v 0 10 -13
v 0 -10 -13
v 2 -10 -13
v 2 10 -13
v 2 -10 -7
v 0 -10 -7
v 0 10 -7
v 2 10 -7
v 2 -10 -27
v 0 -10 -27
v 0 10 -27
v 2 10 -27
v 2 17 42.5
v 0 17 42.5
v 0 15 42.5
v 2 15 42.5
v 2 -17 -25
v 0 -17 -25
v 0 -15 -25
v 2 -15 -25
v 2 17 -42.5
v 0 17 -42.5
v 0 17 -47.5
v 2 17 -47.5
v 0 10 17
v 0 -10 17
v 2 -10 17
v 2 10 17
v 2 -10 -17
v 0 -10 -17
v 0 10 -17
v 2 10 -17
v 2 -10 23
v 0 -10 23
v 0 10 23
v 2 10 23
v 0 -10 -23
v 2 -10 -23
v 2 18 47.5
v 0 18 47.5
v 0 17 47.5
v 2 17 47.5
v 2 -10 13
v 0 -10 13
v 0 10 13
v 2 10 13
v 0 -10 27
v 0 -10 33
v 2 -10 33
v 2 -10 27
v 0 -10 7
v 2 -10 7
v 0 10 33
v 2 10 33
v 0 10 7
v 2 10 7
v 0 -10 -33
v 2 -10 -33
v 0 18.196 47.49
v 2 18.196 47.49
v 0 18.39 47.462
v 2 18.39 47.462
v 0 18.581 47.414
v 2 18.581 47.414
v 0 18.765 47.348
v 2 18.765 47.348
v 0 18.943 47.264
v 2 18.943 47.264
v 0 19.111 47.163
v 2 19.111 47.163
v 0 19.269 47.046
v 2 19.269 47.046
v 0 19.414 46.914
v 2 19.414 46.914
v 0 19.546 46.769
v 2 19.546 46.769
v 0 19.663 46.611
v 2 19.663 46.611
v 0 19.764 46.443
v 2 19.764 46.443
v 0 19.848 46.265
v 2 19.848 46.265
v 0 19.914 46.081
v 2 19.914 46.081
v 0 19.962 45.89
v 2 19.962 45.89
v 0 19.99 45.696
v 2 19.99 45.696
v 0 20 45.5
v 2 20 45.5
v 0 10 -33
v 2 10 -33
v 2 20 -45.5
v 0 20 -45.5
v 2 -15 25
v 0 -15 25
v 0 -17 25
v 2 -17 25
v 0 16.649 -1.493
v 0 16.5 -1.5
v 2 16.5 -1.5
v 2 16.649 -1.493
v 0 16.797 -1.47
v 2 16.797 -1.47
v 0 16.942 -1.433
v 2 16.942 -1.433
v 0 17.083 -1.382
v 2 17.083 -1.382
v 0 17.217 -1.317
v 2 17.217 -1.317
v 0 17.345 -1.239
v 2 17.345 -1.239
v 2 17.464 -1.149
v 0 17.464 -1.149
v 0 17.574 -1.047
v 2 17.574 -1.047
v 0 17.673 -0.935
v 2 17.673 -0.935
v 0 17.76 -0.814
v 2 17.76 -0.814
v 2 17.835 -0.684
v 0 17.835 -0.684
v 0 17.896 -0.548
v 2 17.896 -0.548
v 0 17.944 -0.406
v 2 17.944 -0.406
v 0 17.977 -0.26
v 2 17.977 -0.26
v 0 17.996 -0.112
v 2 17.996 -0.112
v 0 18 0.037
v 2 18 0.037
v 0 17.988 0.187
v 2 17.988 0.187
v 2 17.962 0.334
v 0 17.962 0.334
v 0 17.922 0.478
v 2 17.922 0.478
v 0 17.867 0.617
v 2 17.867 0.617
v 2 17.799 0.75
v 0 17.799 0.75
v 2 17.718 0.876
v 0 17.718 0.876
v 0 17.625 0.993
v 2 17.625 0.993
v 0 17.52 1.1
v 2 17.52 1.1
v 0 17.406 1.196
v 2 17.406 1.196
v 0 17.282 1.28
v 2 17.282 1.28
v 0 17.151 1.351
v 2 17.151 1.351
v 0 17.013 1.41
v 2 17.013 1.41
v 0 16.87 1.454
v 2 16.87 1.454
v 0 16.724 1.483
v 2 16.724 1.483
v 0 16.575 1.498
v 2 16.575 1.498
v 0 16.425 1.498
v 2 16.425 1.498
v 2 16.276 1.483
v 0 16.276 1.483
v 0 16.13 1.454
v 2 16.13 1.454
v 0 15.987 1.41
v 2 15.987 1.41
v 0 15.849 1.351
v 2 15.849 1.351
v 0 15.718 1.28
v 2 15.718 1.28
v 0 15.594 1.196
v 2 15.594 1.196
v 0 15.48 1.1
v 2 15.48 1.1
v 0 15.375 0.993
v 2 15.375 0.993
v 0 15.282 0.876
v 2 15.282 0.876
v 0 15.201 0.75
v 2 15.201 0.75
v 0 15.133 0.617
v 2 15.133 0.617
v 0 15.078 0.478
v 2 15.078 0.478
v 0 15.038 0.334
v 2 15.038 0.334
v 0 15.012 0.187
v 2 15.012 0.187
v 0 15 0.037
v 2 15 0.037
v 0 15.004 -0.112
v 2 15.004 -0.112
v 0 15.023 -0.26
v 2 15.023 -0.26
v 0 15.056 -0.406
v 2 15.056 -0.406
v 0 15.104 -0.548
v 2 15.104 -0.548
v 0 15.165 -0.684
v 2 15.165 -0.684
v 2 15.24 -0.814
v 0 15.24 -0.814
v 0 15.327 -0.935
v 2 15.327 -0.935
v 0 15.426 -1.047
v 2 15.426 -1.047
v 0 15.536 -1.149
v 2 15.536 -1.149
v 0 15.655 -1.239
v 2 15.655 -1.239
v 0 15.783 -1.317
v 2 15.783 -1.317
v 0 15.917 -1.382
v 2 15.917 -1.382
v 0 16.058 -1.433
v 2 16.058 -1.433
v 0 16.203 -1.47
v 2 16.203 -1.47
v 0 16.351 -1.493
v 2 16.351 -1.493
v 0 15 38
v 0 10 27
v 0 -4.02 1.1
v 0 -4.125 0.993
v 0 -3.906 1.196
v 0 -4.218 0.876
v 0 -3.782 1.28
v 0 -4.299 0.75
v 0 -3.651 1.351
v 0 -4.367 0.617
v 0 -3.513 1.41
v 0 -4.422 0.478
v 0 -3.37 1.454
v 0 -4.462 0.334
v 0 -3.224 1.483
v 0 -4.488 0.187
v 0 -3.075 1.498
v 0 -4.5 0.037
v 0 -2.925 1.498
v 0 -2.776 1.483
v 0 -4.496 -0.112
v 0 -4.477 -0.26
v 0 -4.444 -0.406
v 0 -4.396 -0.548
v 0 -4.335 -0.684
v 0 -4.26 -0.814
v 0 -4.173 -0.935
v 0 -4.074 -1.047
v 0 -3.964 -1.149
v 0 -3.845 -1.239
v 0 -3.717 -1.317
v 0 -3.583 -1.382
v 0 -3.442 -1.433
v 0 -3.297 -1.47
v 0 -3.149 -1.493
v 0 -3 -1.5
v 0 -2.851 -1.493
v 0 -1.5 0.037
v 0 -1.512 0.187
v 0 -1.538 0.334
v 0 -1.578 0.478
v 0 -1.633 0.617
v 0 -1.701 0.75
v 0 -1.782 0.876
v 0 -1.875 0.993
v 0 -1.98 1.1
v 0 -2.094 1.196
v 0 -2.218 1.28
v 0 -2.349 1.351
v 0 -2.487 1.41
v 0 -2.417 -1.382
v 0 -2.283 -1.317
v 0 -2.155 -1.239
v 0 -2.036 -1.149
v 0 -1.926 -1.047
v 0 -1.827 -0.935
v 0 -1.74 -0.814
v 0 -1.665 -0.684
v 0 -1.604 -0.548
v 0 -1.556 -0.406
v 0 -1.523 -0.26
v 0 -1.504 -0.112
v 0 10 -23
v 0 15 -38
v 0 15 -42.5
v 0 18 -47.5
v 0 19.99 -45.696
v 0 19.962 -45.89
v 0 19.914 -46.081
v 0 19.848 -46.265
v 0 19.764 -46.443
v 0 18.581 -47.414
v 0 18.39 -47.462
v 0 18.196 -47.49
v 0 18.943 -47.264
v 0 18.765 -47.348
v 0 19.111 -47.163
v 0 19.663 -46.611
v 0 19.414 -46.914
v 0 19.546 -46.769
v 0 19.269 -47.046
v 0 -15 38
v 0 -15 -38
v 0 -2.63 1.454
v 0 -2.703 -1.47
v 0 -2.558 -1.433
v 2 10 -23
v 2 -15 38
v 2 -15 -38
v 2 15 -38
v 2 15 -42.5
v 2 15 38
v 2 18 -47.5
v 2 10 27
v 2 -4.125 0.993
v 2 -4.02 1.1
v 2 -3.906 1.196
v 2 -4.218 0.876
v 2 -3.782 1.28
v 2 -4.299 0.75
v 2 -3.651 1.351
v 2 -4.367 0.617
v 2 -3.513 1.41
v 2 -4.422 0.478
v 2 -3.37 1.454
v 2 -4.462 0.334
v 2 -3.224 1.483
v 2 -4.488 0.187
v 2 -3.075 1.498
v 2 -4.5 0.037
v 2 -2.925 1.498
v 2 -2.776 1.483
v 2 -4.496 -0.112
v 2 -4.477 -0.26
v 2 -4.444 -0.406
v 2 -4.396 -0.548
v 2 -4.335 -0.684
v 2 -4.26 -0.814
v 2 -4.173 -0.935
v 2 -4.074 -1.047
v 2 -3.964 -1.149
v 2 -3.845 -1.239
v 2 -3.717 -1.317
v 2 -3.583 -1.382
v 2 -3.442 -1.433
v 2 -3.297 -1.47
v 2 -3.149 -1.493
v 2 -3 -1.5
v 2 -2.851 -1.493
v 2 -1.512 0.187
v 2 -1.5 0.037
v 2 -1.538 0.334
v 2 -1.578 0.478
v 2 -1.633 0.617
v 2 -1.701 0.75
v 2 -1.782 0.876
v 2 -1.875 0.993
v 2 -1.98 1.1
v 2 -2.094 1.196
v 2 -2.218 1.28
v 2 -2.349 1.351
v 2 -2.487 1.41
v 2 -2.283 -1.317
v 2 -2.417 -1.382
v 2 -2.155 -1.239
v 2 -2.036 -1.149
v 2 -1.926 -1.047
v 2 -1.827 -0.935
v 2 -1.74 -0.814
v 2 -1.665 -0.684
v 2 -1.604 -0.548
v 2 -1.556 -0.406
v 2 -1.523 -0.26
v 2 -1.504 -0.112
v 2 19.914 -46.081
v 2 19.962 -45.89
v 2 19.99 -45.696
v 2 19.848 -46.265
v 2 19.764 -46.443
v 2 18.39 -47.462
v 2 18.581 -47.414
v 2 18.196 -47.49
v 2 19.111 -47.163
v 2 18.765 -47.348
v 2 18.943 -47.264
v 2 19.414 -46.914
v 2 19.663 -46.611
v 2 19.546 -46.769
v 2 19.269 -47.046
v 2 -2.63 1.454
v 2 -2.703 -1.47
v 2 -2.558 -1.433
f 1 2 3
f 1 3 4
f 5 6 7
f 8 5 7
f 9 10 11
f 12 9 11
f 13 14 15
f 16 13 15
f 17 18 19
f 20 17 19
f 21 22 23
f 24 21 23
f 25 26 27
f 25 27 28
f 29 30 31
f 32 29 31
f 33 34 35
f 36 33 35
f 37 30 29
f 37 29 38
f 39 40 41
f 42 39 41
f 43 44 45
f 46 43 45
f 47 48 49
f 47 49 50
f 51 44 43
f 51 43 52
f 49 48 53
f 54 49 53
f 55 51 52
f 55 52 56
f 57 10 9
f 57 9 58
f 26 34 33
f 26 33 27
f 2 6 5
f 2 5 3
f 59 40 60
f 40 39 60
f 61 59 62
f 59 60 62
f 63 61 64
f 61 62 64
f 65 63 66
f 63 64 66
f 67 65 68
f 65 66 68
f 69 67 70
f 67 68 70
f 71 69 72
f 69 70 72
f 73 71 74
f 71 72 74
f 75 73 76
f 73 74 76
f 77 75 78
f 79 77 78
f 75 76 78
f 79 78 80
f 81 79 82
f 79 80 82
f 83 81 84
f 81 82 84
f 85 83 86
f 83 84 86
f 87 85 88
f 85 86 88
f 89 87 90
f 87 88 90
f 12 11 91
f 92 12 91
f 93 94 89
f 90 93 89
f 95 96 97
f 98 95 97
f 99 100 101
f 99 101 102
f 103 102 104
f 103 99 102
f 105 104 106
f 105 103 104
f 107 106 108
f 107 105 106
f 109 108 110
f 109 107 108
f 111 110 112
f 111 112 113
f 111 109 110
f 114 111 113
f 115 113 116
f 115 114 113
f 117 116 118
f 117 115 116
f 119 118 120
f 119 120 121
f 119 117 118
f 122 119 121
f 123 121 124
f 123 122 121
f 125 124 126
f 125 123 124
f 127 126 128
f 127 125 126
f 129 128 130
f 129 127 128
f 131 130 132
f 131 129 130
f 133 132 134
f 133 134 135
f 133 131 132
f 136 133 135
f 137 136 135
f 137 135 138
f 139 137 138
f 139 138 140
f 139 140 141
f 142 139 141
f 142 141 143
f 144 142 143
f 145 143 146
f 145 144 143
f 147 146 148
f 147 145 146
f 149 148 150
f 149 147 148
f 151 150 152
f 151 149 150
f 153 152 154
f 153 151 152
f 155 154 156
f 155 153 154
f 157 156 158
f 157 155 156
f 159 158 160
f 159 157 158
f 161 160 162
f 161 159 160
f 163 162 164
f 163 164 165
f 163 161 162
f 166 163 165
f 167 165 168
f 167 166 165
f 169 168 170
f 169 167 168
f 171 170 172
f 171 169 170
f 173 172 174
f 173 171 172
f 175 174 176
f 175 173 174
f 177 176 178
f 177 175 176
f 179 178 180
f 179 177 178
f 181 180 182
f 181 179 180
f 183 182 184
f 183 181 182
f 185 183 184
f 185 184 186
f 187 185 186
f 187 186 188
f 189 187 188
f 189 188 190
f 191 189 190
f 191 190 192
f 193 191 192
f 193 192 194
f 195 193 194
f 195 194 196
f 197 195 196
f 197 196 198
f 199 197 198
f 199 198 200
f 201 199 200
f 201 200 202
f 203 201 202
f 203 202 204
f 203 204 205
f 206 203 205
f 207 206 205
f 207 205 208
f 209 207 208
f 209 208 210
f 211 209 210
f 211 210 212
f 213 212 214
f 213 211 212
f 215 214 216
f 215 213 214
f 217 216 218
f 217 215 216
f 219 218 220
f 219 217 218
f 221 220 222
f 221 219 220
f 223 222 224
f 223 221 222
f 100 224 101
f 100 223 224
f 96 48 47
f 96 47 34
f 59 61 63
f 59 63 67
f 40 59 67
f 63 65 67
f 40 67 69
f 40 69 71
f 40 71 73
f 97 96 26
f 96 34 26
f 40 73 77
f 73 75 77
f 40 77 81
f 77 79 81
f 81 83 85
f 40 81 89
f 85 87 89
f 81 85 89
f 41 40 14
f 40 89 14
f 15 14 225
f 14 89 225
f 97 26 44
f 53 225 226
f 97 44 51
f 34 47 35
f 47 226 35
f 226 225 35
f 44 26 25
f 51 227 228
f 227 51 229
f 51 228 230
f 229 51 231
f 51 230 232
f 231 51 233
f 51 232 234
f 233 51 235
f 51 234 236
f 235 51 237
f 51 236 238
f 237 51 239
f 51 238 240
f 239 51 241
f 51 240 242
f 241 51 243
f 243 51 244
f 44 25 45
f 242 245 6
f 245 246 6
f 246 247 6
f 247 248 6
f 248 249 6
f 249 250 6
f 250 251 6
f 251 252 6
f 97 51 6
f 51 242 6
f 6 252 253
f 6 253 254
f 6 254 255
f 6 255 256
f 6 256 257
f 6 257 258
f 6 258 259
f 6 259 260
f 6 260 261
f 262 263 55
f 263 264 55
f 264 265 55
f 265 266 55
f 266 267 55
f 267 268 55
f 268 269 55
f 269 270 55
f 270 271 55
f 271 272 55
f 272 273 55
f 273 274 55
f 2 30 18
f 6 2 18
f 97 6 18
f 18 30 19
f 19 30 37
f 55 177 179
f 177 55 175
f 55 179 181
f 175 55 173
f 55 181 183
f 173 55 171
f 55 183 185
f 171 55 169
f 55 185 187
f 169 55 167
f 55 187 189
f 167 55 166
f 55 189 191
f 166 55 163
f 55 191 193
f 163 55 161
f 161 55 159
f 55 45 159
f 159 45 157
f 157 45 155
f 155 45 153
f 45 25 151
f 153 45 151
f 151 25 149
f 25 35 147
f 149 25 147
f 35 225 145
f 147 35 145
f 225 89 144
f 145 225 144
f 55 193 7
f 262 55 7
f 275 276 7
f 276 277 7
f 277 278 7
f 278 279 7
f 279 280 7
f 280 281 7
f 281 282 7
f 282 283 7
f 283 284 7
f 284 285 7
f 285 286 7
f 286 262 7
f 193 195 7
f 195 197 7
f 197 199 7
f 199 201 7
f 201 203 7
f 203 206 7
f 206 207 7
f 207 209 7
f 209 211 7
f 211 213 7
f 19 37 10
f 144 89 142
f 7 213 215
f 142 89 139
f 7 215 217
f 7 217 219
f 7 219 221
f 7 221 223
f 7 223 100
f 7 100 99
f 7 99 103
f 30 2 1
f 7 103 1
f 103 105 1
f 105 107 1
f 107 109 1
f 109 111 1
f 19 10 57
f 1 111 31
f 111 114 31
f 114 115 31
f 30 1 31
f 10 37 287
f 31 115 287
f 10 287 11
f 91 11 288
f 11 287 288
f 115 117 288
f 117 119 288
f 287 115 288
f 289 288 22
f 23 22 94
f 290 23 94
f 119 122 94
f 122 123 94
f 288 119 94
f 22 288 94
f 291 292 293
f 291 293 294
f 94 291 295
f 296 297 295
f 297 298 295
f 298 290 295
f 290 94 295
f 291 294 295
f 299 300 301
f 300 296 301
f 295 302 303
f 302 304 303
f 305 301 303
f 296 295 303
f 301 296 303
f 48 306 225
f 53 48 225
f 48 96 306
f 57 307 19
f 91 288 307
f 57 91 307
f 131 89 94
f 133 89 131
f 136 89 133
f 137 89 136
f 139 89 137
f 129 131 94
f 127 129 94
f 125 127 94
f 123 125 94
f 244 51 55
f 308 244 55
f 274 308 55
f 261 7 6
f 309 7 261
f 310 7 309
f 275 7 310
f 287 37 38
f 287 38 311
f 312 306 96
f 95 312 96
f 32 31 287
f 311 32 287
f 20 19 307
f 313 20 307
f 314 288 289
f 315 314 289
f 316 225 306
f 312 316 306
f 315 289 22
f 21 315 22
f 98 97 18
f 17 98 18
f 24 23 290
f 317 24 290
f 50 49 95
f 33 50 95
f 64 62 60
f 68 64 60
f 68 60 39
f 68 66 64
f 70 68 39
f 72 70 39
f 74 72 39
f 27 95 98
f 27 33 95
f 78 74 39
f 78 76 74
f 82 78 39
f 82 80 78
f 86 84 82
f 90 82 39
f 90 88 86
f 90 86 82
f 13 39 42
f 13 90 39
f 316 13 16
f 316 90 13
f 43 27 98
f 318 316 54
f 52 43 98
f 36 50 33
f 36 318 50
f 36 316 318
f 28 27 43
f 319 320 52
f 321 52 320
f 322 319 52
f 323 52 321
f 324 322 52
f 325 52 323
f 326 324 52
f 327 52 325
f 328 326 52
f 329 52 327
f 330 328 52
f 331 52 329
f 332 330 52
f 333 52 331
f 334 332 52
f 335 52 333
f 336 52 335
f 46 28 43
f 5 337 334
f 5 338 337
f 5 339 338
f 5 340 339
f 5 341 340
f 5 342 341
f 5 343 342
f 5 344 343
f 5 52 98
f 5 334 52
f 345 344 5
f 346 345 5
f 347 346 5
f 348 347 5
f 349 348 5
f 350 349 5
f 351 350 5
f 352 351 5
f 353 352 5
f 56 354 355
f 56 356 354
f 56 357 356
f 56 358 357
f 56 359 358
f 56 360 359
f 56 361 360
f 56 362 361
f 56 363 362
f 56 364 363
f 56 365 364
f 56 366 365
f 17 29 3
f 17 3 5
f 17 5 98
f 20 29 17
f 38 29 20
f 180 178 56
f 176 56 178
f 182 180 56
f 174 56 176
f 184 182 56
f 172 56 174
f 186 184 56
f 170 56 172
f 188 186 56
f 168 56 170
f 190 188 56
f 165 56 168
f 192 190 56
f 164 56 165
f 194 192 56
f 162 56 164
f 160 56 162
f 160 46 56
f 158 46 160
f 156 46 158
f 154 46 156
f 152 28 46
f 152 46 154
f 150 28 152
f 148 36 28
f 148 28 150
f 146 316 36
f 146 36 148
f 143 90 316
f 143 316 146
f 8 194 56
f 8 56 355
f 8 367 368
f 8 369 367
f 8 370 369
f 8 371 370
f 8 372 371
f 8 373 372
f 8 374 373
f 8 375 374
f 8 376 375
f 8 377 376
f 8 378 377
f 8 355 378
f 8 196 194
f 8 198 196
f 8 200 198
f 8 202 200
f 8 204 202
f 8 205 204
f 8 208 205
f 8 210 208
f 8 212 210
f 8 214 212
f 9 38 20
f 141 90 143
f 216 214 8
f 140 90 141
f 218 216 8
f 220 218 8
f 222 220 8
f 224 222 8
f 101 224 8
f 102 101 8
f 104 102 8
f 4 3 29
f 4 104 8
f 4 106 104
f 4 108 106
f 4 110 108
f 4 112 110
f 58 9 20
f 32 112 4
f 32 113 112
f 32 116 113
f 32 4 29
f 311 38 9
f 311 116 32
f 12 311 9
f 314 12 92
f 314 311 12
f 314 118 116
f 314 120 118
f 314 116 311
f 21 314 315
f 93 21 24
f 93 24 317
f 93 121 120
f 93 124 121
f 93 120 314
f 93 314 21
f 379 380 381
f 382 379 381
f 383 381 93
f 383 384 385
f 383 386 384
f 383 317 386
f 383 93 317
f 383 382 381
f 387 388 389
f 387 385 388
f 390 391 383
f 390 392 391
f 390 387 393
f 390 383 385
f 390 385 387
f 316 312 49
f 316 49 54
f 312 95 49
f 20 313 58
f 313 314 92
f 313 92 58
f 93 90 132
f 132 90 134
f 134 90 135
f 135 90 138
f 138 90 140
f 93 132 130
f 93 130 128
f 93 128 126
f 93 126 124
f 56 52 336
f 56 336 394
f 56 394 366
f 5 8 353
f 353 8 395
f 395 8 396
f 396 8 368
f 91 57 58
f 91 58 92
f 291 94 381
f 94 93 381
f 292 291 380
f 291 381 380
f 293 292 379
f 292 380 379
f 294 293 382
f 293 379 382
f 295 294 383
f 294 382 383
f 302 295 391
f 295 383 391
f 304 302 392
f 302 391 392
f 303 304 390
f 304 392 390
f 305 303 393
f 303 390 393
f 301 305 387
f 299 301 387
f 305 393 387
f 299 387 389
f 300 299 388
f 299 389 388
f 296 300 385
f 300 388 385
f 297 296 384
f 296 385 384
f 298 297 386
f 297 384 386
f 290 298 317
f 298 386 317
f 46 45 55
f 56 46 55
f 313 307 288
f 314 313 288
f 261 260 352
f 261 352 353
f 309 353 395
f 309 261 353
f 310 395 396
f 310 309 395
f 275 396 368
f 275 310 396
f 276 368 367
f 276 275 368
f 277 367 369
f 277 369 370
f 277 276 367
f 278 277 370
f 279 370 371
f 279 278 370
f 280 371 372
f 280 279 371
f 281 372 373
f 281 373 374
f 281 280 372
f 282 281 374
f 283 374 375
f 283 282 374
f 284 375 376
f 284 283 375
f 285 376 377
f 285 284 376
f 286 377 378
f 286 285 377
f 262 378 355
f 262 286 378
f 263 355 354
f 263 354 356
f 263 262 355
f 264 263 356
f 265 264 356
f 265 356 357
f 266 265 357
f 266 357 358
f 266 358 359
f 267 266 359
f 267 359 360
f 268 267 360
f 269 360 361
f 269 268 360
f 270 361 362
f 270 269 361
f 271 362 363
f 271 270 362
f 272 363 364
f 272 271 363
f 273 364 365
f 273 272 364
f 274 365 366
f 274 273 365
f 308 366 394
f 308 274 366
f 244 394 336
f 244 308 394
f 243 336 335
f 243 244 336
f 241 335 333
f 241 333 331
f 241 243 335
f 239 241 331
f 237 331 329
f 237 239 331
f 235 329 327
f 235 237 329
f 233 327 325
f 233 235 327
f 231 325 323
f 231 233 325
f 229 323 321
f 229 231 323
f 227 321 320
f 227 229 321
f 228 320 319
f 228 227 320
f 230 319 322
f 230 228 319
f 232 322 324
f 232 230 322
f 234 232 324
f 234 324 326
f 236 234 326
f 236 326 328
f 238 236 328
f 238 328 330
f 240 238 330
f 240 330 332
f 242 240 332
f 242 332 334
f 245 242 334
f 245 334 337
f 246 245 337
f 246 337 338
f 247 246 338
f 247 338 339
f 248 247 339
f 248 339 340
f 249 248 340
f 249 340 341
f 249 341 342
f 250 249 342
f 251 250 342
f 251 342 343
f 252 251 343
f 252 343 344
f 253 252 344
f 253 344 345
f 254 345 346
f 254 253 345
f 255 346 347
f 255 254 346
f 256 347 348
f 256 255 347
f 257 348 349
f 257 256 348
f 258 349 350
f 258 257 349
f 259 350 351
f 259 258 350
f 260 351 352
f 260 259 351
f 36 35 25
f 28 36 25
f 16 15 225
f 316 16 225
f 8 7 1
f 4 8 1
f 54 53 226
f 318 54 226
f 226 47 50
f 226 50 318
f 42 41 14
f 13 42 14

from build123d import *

# Parameters (mm, degrees)
SKETCH1_R           = 1.5
SKETCH1_W           = 6
SKETCH1_H           = 20
BOSS_EXTRUDE1_DEPTH = 2
FILLET2_R           = 2


with BuildPart() as part:
    # Sketch1 → Boss-Extrude1 (new body)
    with BuildSketch(Plane(origin=(0, 0, 0), x_dir=(0, 0, -1), z_dir=(1, 0, 0))):
        Polygon((-25, -15), (-25, -17), (25, -17), (25, -15), (38, -15), (38, 15), (42.5, 15), (42.5, 17), (47.5, 17), (47.5, 20), (-47.5, 20), (-47.5, 17), (-42.5, 17), (-42.5, 15), (-38, 15), (-38, -15), align=None)
        with Locations((0, 16.5)):
            Circle(SKETCH1_R, mode=Mode.SUBTRACT)
        with Locations((0, -3)):
            Circle(SKETCH1_R, mode=Mode.SUBTRACT)
        with Locations((20, 0)):
            Rectangle(SKETCH1_W, SKETCH1_H, mode=Mode.SUBTRACT)
        with Locations((30, 0)):
            Rectangle(SKETCH1_W, SKETCH1_H, mode=Mode.SUBTRACT)
        with Locations((10, 0)):
            Rectangle(SKETCH1_W, SKETCH1_H, mode=Mode.SUBTRACT)
        with Locations((-10, 0)):
            Rectangle(SKETCH1_W, SKETCH1_H, mode=Mode.SUBTRACT)
        with Locations((-20, 0)):
            Rectangle(SKETCH1_W, SKETCH1_H, mode=Mode.SUBTRACT)
        with Locations((-30, 0)):
            Rectangle(SKETCH1_W, SKETCH1_H, mode=Mode.SUBTRACT)
    extrude(amount=BOSS_EXTRUDE1_DEPTH)

    # Fillet2
    fillet2_edges = [part.edges().sort_by_distance(p)[0] for p in [
        (1, 20, 47.5),
        (1, 20, -47.5),
    ]]
    fillet(fillet2_edges, radius=FILLET2_R)


solid = part.part
